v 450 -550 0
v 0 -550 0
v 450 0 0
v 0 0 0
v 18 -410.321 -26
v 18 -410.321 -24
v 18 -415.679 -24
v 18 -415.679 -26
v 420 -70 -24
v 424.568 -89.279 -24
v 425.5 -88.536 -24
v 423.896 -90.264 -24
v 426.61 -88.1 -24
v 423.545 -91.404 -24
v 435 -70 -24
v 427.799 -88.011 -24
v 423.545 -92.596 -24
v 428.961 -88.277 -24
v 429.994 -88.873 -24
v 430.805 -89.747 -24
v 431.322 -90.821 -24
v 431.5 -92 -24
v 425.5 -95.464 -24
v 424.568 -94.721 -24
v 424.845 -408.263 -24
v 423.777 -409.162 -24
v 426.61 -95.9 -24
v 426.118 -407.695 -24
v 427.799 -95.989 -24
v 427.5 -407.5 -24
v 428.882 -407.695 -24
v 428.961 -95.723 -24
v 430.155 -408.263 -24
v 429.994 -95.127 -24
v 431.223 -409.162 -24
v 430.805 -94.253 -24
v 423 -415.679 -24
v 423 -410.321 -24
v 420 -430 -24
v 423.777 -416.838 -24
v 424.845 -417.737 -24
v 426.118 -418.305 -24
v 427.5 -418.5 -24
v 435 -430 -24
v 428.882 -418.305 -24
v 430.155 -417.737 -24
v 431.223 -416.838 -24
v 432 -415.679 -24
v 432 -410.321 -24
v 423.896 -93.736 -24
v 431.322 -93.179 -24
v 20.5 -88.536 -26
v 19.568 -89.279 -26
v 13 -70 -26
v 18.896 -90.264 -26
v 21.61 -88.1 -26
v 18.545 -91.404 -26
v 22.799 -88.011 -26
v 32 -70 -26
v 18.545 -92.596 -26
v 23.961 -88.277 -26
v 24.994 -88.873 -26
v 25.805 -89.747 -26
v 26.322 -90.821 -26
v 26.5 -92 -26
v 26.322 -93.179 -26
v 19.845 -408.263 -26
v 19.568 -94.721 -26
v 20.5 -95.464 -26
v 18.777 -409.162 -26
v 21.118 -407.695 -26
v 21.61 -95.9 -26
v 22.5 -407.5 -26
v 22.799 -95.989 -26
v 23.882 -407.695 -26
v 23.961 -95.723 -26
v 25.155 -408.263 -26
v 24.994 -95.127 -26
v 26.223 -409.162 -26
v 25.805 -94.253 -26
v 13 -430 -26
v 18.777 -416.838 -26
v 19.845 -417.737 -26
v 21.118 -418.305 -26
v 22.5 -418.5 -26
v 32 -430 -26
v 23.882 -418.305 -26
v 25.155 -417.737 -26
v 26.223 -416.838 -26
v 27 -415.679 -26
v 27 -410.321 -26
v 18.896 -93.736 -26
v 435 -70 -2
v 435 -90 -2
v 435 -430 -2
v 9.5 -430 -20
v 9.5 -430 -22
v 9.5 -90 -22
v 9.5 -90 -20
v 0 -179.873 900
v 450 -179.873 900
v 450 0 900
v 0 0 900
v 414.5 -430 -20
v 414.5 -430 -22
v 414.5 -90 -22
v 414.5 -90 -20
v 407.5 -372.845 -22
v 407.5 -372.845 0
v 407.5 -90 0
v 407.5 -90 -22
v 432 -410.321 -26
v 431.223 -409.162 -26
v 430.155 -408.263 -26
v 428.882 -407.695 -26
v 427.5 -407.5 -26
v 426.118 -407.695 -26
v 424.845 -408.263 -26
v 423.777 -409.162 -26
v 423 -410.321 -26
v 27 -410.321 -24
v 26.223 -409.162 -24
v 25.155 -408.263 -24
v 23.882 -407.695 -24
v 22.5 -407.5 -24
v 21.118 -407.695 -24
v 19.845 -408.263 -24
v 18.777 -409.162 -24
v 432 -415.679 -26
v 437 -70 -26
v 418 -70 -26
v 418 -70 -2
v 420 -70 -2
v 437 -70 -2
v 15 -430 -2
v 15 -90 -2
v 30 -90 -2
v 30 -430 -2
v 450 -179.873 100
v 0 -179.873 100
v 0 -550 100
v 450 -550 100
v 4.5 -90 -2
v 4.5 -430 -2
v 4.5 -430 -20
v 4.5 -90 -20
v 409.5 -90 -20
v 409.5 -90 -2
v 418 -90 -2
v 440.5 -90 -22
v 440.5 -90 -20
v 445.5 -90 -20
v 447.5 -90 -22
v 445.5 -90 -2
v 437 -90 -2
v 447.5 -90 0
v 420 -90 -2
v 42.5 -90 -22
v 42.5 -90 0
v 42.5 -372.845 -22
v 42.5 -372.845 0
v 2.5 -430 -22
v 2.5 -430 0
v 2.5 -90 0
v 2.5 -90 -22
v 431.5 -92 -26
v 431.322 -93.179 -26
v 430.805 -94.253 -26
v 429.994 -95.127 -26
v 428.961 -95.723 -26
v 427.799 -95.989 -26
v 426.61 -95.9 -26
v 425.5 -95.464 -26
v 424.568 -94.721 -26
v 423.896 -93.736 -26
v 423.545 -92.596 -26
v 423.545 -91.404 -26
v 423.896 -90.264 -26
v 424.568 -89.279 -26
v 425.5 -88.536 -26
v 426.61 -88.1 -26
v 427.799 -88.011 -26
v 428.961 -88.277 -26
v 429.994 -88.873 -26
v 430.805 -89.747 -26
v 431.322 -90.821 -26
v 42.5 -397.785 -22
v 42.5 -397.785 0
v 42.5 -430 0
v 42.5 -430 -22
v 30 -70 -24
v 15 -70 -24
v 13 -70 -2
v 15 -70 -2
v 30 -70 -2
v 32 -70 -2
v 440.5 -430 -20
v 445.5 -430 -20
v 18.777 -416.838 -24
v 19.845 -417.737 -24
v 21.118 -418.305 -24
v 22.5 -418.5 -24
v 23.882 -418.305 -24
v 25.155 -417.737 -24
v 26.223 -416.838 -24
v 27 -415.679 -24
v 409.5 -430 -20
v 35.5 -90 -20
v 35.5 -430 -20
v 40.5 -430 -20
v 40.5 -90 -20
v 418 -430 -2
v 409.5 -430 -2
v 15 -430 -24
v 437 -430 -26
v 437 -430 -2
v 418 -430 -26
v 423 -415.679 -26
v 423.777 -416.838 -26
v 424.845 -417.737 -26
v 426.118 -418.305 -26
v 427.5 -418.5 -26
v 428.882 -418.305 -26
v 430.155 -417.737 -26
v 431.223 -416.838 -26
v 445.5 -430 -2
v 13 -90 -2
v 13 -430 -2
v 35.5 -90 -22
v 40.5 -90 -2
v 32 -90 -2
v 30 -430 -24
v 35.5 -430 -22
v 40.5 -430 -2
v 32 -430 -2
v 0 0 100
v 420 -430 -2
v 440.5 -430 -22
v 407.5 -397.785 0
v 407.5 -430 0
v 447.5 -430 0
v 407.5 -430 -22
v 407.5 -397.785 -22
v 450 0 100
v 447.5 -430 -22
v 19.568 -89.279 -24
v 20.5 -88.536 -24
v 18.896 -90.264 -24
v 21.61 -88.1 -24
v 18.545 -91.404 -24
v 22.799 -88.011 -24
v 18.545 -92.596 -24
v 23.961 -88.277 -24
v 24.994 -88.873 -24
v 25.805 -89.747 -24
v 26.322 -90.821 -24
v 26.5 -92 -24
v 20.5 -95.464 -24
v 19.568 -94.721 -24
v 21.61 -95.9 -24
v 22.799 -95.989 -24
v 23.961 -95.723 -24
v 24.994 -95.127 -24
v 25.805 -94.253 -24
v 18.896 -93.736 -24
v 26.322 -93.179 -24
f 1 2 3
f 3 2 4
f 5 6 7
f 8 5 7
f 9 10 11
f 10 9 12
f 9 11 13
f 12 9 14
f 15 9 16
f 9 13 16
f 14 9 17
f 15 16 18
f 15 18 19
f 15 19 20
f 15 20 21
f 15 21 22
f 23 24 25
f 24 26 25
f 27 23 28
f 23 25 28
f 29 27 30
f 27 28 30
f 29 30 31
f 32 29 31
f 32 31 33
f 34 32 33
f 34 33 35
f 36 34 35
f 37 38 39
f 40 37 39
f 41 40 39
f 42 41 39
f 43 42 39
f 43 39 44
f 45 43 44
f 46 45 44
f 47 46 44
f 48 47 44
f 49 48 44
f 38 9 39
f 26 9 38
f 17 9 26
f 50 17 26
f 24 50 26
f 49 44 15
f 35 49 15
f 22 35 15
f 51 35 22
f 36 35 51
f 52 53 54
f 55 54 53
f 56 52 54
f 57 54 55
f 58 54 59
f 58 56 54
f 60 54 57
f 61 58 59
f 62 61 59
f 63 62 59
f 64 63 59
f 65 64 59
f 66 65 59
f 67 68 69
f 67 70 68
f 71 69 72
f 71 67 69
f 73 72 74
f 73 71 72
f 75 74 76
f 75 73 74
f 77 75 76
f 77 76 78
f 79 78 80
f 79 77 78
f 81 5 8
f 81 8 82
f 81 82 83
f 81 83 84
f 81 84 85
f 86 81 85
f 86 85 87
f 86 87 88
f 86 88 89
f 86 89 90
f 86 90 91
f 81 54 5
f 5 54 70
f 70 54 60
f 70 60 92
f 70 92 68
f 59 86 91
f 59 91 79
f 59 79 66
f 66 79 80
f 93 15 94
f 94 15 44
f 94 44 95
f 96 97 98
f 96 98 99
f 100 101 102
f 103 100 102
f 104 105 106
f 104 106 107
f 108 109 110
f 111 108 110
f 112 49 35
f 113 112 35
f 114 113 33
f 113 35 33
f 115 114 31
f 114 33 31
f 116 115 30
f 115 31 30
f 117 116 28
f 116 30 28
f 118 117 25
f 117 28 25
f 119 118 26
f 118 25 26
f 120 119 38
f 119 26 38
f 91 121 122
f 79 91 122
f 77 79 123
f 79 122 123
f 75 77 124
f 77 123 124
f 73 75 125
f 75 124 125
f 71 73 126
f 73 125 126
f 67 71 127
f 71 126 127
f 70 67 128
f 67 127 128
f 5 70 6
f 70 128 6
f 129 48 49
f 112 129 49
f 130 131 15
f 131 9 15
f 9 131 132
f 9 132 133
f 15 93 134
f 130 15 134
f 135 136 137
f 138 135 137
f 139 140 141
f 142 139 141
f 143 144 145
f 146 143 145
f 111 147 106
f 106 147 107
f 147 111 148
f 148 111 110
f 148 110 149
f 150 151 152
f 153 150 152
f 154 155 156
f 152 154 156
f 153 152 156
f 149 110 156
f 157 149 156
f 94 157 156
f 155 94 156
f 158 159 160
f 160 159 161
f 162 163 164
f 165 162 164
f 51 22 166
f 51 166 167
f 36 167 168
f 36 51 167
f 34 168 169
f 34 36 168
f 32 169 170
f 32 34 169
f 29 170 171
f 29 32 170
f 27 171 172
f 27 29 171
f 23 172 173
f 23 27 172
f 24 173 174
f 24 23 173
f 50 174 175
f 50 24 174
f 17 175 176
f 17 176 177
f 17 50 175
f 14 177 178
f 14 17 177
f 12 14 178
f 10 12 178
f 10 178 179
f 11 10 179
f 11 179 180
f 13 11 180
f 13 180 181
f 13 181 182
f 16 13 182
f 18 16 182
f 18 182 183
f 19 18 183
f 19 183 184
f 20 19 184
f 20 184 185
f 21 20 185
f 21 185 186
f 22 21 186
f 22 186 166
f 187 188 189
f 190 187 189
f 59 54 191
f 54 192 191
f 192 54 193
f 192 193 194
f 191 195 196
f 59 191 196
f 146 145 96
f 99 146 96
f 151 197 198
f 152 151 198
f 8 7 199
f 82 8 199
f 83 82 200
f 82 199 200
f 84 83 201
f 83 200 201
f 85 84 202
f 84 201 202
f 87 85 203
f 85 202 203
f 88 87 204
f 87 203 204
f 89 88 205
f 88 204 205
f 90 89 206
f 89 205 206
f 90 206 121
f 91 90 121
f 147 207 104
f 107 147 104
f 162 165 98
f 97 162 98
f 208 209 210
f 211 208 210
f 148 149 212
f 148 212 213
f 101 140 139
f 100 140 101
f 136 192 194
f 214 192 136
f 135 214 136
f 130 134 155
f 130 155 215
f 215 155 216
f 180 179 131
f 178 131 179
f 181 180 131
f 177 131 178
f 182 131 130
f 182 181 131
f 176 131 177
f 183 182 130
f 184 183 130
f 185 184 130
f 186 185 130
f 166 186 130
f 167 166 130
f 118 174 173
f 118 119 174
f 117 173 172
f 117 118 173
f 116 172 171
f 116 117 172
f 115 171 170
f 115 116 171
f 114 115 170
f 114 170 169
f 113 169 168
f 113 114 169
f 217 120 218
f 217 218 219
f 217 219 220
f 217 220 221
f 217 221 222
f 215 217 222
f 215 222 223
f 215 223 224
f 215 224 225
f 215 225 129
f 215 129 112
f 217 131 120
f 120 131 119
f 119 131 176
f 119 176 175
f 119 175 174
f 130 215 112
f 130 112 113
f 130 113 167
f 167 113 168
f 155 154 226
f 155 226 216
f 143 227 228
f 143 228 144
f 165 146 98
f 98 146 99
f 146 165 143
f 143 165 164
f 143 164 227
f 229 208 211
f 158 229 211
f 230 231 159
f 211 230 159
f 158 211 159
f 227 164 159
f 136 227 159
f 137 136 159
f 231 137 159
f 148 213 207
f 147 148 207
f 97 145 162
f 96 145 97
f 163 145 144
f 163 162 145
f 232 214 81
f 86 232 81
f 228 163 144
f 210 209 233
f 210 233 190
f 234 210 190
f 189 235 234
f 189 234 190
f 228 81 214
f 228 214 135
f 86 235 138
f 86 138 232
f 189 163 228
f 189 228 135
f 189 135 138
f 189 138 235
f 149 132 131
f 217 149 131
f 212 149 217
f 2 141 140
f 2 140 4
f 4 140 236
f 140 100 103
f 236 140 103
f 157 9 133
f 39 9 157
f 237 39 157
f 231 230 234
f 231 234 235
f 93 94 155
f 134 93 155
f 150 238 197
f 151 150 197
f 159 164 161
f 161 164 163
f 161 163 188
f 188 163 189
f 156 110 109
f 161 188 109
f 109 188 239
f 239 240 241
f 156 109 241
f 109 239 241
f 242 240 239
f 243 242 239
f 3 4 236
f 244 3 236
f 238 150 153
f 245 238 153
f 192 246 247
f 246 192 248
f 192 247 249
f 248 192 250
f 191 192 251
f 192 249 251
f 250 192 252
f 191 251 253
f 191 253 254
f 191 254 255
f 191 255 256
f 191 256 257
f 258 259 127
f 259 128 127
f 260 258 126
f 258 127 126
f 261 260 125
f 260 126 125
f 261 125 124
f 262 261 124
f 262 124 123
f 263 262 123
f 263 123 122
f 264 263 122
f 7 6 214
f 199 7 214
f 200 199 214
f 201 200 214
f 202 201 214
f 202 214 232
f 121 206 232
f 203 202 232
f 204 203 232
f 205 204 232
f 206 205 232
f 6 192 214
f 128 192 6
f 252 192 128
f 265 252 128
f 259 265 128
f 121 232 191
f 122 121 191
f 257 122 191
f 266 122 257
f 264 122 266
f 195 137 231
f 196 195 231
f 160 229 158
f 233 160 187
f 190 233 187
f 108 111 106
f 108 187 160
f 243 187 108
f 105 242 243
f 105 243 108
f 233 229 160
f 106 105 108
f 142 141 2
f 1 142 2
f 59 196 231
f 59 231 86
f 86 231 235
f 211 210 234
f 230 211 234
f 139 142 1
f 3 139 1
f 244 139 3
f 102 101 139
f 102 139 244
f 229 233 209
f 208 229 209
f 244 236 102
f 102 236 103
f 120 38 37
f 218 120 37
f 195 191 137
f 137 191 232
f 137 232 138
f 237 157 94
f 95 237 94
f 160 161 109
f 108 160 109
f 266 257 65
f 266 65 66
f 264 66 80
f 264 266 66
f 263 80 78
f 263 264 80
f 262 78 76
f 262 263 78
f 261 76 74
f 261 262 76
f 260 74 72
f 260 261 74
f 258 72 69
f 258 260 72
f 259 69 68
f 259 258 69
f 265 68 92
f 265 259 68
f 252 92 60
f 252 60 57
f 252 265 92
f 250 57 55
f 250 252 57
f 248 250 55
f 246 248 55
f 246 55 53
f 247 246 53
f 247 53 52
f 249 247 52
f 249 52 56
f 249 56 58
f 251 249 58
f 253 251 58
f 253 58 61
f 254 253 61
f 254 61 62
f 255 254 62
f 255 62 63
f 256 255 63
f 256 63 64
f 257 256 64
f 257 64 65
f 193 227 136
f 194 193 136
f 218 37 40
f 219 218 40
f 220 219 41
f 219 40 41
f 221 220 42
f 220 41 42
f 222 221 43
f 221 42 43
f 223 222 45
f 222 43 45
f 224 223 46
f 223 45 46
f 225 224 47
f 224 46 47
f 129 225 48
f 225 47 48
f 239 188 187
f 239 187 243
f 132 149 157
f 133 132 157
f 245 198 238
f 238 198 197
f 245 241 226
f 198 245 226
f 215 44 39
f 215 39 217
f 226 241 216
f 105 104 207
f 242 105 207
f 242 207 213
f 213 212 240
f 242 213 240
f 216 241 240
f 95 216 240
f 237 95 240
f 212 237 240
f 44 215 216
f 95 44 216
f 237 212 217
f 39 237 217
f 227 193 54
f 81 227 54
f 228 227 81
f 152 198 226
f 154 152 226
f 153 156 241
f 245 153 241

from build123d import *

# Parameters (mm, degrees)
F0_W     = 179.872523
F0_H     = 800
F1_DEPTH = 450
F2_W     = 365
F2_H     = 24.940014
F3_DEPTH = 22
F4_W     = 26
F4_H     = 2
F5_DEPTH = 372
F6_W     = 19
F6_H     = 360
F6_R     = 4
F7_DEPTH = 24
F8_W     = 15
F8_H     = 22
F9_DEPTH = 420


with BuildPart() as f1:
    # F0 (on Right) → F1 (new body)
    with BuildSketch(Plane.YZ):
        Polygon((-550, 0), (0, 0), (0, 100), (-179.872523, 100), (-550, 100), align=None)
        with Locations((-89.936262, 500)):
            Rectangle(F0_W, F0_H)
    extrude(amount=F1_DEPTH)


with BuildPart() as f3:
    # F2 (on face) → F3 (new body)
    with BuildSketch(Plane(origin=(0, 0, 0), x_dir=(1, 0, 0), z_dir=(0, 0, -1))):
        Polygon((42.5, 430), (2.5, 430), (2.5, 90), (42.5, 90), (42.5, 372.844845), (42.5, 397.784859), align=None)
        with Locations((225, 385.314852)):
            Rectangle(F2_W, F2_H)
        Polygon((407.5, 430), (407.5, 397.784859), (407.5, 372.844845), (407.5, 90), (447.5, 90), (447.5, 430), align=None)
    extrude(amount=F3_DEPTH)

    # F4 (on face) → F5 (cut)
    with BuildSketch(Plane.XZ.offset(430)):
        Polygon((40.5, -2), (4.5, -2), (4.5, -20), (9.5, -20), (35.5, -20), (40.5, -20), align=None)
        with Locations((22.5, -21)):
            Rectangle(F4_W, F4_H)
        with Locations((427.5, -21)):
            Rectangle(F4_W, F4_H)
        Polygon((409.5, -20), (414.5, -20), (440.5, -20), (445.5, -20), (445.5, -2), (409.5, -2), align=None)
    extrude(amount=-F5_DEPTH, mode=Mode.SUBTRACT)

    # F6 (on face) → F7 (join)
    with BuildSketch(Plane(origin=(0, 0, -2), x_dir=(1, 0, 0), z_dir=(0, 0, -1))):
        with Locations((22.5, 250)):
            Rectangle(F6_W, F6_H)
        with Locations((22.5, 92)):
            Circle(F6_R, mode=Mode.SUBTRACT)
        with BuildLine():
            Line((18, 410.320551), (18, 415.679449))
            ThreePointArc((18, 415.679449), (22.5, 418.5), (27, 415.679449))
            Line((27, 415.679449), (27, 410.320551))
            ThreePointArc((27, 410.320551), (22.5, 407.5), (18, 410.320551))
        make_face(mode=Mode.SUBTRACT)
        with Locations((427.5, 250)):
            Rectangle(F6_W, F6_H)
        with Locations((427.5, 92)):
            Circle(F6_R, mode=Mode.SUBTRACT)
        with BuildLine():
            ThreePointArc((423, 415.679449), (427.5, 418.5), (432, 415.679449))
            Line((432, 415.679449), (432, 410.320551))
            ThreePointArc((432, 410.320551), (427.5, 407.5), (423, 410.320551))
            Line((423, 410.320551), (423, 415.679449))
        make_face(mode=Mode.SUBTRACT)
    extrude(amount=F7_DEPTH)

    # F8 (on face) → F9 (cut)
    with BuildSketch(Plane.XZ.offset(430)):
        with Locations((22.5, -13)):
            Rectangle(F8_W, F8_H)
        with Locations((427.5, -13)):
            Rectangle(F8_W, F8_H)
    extrude(amount=-F9_DEPTH, mode=Mode.SUBTRACT)


solid = Compound([f1.part, f3.part])
